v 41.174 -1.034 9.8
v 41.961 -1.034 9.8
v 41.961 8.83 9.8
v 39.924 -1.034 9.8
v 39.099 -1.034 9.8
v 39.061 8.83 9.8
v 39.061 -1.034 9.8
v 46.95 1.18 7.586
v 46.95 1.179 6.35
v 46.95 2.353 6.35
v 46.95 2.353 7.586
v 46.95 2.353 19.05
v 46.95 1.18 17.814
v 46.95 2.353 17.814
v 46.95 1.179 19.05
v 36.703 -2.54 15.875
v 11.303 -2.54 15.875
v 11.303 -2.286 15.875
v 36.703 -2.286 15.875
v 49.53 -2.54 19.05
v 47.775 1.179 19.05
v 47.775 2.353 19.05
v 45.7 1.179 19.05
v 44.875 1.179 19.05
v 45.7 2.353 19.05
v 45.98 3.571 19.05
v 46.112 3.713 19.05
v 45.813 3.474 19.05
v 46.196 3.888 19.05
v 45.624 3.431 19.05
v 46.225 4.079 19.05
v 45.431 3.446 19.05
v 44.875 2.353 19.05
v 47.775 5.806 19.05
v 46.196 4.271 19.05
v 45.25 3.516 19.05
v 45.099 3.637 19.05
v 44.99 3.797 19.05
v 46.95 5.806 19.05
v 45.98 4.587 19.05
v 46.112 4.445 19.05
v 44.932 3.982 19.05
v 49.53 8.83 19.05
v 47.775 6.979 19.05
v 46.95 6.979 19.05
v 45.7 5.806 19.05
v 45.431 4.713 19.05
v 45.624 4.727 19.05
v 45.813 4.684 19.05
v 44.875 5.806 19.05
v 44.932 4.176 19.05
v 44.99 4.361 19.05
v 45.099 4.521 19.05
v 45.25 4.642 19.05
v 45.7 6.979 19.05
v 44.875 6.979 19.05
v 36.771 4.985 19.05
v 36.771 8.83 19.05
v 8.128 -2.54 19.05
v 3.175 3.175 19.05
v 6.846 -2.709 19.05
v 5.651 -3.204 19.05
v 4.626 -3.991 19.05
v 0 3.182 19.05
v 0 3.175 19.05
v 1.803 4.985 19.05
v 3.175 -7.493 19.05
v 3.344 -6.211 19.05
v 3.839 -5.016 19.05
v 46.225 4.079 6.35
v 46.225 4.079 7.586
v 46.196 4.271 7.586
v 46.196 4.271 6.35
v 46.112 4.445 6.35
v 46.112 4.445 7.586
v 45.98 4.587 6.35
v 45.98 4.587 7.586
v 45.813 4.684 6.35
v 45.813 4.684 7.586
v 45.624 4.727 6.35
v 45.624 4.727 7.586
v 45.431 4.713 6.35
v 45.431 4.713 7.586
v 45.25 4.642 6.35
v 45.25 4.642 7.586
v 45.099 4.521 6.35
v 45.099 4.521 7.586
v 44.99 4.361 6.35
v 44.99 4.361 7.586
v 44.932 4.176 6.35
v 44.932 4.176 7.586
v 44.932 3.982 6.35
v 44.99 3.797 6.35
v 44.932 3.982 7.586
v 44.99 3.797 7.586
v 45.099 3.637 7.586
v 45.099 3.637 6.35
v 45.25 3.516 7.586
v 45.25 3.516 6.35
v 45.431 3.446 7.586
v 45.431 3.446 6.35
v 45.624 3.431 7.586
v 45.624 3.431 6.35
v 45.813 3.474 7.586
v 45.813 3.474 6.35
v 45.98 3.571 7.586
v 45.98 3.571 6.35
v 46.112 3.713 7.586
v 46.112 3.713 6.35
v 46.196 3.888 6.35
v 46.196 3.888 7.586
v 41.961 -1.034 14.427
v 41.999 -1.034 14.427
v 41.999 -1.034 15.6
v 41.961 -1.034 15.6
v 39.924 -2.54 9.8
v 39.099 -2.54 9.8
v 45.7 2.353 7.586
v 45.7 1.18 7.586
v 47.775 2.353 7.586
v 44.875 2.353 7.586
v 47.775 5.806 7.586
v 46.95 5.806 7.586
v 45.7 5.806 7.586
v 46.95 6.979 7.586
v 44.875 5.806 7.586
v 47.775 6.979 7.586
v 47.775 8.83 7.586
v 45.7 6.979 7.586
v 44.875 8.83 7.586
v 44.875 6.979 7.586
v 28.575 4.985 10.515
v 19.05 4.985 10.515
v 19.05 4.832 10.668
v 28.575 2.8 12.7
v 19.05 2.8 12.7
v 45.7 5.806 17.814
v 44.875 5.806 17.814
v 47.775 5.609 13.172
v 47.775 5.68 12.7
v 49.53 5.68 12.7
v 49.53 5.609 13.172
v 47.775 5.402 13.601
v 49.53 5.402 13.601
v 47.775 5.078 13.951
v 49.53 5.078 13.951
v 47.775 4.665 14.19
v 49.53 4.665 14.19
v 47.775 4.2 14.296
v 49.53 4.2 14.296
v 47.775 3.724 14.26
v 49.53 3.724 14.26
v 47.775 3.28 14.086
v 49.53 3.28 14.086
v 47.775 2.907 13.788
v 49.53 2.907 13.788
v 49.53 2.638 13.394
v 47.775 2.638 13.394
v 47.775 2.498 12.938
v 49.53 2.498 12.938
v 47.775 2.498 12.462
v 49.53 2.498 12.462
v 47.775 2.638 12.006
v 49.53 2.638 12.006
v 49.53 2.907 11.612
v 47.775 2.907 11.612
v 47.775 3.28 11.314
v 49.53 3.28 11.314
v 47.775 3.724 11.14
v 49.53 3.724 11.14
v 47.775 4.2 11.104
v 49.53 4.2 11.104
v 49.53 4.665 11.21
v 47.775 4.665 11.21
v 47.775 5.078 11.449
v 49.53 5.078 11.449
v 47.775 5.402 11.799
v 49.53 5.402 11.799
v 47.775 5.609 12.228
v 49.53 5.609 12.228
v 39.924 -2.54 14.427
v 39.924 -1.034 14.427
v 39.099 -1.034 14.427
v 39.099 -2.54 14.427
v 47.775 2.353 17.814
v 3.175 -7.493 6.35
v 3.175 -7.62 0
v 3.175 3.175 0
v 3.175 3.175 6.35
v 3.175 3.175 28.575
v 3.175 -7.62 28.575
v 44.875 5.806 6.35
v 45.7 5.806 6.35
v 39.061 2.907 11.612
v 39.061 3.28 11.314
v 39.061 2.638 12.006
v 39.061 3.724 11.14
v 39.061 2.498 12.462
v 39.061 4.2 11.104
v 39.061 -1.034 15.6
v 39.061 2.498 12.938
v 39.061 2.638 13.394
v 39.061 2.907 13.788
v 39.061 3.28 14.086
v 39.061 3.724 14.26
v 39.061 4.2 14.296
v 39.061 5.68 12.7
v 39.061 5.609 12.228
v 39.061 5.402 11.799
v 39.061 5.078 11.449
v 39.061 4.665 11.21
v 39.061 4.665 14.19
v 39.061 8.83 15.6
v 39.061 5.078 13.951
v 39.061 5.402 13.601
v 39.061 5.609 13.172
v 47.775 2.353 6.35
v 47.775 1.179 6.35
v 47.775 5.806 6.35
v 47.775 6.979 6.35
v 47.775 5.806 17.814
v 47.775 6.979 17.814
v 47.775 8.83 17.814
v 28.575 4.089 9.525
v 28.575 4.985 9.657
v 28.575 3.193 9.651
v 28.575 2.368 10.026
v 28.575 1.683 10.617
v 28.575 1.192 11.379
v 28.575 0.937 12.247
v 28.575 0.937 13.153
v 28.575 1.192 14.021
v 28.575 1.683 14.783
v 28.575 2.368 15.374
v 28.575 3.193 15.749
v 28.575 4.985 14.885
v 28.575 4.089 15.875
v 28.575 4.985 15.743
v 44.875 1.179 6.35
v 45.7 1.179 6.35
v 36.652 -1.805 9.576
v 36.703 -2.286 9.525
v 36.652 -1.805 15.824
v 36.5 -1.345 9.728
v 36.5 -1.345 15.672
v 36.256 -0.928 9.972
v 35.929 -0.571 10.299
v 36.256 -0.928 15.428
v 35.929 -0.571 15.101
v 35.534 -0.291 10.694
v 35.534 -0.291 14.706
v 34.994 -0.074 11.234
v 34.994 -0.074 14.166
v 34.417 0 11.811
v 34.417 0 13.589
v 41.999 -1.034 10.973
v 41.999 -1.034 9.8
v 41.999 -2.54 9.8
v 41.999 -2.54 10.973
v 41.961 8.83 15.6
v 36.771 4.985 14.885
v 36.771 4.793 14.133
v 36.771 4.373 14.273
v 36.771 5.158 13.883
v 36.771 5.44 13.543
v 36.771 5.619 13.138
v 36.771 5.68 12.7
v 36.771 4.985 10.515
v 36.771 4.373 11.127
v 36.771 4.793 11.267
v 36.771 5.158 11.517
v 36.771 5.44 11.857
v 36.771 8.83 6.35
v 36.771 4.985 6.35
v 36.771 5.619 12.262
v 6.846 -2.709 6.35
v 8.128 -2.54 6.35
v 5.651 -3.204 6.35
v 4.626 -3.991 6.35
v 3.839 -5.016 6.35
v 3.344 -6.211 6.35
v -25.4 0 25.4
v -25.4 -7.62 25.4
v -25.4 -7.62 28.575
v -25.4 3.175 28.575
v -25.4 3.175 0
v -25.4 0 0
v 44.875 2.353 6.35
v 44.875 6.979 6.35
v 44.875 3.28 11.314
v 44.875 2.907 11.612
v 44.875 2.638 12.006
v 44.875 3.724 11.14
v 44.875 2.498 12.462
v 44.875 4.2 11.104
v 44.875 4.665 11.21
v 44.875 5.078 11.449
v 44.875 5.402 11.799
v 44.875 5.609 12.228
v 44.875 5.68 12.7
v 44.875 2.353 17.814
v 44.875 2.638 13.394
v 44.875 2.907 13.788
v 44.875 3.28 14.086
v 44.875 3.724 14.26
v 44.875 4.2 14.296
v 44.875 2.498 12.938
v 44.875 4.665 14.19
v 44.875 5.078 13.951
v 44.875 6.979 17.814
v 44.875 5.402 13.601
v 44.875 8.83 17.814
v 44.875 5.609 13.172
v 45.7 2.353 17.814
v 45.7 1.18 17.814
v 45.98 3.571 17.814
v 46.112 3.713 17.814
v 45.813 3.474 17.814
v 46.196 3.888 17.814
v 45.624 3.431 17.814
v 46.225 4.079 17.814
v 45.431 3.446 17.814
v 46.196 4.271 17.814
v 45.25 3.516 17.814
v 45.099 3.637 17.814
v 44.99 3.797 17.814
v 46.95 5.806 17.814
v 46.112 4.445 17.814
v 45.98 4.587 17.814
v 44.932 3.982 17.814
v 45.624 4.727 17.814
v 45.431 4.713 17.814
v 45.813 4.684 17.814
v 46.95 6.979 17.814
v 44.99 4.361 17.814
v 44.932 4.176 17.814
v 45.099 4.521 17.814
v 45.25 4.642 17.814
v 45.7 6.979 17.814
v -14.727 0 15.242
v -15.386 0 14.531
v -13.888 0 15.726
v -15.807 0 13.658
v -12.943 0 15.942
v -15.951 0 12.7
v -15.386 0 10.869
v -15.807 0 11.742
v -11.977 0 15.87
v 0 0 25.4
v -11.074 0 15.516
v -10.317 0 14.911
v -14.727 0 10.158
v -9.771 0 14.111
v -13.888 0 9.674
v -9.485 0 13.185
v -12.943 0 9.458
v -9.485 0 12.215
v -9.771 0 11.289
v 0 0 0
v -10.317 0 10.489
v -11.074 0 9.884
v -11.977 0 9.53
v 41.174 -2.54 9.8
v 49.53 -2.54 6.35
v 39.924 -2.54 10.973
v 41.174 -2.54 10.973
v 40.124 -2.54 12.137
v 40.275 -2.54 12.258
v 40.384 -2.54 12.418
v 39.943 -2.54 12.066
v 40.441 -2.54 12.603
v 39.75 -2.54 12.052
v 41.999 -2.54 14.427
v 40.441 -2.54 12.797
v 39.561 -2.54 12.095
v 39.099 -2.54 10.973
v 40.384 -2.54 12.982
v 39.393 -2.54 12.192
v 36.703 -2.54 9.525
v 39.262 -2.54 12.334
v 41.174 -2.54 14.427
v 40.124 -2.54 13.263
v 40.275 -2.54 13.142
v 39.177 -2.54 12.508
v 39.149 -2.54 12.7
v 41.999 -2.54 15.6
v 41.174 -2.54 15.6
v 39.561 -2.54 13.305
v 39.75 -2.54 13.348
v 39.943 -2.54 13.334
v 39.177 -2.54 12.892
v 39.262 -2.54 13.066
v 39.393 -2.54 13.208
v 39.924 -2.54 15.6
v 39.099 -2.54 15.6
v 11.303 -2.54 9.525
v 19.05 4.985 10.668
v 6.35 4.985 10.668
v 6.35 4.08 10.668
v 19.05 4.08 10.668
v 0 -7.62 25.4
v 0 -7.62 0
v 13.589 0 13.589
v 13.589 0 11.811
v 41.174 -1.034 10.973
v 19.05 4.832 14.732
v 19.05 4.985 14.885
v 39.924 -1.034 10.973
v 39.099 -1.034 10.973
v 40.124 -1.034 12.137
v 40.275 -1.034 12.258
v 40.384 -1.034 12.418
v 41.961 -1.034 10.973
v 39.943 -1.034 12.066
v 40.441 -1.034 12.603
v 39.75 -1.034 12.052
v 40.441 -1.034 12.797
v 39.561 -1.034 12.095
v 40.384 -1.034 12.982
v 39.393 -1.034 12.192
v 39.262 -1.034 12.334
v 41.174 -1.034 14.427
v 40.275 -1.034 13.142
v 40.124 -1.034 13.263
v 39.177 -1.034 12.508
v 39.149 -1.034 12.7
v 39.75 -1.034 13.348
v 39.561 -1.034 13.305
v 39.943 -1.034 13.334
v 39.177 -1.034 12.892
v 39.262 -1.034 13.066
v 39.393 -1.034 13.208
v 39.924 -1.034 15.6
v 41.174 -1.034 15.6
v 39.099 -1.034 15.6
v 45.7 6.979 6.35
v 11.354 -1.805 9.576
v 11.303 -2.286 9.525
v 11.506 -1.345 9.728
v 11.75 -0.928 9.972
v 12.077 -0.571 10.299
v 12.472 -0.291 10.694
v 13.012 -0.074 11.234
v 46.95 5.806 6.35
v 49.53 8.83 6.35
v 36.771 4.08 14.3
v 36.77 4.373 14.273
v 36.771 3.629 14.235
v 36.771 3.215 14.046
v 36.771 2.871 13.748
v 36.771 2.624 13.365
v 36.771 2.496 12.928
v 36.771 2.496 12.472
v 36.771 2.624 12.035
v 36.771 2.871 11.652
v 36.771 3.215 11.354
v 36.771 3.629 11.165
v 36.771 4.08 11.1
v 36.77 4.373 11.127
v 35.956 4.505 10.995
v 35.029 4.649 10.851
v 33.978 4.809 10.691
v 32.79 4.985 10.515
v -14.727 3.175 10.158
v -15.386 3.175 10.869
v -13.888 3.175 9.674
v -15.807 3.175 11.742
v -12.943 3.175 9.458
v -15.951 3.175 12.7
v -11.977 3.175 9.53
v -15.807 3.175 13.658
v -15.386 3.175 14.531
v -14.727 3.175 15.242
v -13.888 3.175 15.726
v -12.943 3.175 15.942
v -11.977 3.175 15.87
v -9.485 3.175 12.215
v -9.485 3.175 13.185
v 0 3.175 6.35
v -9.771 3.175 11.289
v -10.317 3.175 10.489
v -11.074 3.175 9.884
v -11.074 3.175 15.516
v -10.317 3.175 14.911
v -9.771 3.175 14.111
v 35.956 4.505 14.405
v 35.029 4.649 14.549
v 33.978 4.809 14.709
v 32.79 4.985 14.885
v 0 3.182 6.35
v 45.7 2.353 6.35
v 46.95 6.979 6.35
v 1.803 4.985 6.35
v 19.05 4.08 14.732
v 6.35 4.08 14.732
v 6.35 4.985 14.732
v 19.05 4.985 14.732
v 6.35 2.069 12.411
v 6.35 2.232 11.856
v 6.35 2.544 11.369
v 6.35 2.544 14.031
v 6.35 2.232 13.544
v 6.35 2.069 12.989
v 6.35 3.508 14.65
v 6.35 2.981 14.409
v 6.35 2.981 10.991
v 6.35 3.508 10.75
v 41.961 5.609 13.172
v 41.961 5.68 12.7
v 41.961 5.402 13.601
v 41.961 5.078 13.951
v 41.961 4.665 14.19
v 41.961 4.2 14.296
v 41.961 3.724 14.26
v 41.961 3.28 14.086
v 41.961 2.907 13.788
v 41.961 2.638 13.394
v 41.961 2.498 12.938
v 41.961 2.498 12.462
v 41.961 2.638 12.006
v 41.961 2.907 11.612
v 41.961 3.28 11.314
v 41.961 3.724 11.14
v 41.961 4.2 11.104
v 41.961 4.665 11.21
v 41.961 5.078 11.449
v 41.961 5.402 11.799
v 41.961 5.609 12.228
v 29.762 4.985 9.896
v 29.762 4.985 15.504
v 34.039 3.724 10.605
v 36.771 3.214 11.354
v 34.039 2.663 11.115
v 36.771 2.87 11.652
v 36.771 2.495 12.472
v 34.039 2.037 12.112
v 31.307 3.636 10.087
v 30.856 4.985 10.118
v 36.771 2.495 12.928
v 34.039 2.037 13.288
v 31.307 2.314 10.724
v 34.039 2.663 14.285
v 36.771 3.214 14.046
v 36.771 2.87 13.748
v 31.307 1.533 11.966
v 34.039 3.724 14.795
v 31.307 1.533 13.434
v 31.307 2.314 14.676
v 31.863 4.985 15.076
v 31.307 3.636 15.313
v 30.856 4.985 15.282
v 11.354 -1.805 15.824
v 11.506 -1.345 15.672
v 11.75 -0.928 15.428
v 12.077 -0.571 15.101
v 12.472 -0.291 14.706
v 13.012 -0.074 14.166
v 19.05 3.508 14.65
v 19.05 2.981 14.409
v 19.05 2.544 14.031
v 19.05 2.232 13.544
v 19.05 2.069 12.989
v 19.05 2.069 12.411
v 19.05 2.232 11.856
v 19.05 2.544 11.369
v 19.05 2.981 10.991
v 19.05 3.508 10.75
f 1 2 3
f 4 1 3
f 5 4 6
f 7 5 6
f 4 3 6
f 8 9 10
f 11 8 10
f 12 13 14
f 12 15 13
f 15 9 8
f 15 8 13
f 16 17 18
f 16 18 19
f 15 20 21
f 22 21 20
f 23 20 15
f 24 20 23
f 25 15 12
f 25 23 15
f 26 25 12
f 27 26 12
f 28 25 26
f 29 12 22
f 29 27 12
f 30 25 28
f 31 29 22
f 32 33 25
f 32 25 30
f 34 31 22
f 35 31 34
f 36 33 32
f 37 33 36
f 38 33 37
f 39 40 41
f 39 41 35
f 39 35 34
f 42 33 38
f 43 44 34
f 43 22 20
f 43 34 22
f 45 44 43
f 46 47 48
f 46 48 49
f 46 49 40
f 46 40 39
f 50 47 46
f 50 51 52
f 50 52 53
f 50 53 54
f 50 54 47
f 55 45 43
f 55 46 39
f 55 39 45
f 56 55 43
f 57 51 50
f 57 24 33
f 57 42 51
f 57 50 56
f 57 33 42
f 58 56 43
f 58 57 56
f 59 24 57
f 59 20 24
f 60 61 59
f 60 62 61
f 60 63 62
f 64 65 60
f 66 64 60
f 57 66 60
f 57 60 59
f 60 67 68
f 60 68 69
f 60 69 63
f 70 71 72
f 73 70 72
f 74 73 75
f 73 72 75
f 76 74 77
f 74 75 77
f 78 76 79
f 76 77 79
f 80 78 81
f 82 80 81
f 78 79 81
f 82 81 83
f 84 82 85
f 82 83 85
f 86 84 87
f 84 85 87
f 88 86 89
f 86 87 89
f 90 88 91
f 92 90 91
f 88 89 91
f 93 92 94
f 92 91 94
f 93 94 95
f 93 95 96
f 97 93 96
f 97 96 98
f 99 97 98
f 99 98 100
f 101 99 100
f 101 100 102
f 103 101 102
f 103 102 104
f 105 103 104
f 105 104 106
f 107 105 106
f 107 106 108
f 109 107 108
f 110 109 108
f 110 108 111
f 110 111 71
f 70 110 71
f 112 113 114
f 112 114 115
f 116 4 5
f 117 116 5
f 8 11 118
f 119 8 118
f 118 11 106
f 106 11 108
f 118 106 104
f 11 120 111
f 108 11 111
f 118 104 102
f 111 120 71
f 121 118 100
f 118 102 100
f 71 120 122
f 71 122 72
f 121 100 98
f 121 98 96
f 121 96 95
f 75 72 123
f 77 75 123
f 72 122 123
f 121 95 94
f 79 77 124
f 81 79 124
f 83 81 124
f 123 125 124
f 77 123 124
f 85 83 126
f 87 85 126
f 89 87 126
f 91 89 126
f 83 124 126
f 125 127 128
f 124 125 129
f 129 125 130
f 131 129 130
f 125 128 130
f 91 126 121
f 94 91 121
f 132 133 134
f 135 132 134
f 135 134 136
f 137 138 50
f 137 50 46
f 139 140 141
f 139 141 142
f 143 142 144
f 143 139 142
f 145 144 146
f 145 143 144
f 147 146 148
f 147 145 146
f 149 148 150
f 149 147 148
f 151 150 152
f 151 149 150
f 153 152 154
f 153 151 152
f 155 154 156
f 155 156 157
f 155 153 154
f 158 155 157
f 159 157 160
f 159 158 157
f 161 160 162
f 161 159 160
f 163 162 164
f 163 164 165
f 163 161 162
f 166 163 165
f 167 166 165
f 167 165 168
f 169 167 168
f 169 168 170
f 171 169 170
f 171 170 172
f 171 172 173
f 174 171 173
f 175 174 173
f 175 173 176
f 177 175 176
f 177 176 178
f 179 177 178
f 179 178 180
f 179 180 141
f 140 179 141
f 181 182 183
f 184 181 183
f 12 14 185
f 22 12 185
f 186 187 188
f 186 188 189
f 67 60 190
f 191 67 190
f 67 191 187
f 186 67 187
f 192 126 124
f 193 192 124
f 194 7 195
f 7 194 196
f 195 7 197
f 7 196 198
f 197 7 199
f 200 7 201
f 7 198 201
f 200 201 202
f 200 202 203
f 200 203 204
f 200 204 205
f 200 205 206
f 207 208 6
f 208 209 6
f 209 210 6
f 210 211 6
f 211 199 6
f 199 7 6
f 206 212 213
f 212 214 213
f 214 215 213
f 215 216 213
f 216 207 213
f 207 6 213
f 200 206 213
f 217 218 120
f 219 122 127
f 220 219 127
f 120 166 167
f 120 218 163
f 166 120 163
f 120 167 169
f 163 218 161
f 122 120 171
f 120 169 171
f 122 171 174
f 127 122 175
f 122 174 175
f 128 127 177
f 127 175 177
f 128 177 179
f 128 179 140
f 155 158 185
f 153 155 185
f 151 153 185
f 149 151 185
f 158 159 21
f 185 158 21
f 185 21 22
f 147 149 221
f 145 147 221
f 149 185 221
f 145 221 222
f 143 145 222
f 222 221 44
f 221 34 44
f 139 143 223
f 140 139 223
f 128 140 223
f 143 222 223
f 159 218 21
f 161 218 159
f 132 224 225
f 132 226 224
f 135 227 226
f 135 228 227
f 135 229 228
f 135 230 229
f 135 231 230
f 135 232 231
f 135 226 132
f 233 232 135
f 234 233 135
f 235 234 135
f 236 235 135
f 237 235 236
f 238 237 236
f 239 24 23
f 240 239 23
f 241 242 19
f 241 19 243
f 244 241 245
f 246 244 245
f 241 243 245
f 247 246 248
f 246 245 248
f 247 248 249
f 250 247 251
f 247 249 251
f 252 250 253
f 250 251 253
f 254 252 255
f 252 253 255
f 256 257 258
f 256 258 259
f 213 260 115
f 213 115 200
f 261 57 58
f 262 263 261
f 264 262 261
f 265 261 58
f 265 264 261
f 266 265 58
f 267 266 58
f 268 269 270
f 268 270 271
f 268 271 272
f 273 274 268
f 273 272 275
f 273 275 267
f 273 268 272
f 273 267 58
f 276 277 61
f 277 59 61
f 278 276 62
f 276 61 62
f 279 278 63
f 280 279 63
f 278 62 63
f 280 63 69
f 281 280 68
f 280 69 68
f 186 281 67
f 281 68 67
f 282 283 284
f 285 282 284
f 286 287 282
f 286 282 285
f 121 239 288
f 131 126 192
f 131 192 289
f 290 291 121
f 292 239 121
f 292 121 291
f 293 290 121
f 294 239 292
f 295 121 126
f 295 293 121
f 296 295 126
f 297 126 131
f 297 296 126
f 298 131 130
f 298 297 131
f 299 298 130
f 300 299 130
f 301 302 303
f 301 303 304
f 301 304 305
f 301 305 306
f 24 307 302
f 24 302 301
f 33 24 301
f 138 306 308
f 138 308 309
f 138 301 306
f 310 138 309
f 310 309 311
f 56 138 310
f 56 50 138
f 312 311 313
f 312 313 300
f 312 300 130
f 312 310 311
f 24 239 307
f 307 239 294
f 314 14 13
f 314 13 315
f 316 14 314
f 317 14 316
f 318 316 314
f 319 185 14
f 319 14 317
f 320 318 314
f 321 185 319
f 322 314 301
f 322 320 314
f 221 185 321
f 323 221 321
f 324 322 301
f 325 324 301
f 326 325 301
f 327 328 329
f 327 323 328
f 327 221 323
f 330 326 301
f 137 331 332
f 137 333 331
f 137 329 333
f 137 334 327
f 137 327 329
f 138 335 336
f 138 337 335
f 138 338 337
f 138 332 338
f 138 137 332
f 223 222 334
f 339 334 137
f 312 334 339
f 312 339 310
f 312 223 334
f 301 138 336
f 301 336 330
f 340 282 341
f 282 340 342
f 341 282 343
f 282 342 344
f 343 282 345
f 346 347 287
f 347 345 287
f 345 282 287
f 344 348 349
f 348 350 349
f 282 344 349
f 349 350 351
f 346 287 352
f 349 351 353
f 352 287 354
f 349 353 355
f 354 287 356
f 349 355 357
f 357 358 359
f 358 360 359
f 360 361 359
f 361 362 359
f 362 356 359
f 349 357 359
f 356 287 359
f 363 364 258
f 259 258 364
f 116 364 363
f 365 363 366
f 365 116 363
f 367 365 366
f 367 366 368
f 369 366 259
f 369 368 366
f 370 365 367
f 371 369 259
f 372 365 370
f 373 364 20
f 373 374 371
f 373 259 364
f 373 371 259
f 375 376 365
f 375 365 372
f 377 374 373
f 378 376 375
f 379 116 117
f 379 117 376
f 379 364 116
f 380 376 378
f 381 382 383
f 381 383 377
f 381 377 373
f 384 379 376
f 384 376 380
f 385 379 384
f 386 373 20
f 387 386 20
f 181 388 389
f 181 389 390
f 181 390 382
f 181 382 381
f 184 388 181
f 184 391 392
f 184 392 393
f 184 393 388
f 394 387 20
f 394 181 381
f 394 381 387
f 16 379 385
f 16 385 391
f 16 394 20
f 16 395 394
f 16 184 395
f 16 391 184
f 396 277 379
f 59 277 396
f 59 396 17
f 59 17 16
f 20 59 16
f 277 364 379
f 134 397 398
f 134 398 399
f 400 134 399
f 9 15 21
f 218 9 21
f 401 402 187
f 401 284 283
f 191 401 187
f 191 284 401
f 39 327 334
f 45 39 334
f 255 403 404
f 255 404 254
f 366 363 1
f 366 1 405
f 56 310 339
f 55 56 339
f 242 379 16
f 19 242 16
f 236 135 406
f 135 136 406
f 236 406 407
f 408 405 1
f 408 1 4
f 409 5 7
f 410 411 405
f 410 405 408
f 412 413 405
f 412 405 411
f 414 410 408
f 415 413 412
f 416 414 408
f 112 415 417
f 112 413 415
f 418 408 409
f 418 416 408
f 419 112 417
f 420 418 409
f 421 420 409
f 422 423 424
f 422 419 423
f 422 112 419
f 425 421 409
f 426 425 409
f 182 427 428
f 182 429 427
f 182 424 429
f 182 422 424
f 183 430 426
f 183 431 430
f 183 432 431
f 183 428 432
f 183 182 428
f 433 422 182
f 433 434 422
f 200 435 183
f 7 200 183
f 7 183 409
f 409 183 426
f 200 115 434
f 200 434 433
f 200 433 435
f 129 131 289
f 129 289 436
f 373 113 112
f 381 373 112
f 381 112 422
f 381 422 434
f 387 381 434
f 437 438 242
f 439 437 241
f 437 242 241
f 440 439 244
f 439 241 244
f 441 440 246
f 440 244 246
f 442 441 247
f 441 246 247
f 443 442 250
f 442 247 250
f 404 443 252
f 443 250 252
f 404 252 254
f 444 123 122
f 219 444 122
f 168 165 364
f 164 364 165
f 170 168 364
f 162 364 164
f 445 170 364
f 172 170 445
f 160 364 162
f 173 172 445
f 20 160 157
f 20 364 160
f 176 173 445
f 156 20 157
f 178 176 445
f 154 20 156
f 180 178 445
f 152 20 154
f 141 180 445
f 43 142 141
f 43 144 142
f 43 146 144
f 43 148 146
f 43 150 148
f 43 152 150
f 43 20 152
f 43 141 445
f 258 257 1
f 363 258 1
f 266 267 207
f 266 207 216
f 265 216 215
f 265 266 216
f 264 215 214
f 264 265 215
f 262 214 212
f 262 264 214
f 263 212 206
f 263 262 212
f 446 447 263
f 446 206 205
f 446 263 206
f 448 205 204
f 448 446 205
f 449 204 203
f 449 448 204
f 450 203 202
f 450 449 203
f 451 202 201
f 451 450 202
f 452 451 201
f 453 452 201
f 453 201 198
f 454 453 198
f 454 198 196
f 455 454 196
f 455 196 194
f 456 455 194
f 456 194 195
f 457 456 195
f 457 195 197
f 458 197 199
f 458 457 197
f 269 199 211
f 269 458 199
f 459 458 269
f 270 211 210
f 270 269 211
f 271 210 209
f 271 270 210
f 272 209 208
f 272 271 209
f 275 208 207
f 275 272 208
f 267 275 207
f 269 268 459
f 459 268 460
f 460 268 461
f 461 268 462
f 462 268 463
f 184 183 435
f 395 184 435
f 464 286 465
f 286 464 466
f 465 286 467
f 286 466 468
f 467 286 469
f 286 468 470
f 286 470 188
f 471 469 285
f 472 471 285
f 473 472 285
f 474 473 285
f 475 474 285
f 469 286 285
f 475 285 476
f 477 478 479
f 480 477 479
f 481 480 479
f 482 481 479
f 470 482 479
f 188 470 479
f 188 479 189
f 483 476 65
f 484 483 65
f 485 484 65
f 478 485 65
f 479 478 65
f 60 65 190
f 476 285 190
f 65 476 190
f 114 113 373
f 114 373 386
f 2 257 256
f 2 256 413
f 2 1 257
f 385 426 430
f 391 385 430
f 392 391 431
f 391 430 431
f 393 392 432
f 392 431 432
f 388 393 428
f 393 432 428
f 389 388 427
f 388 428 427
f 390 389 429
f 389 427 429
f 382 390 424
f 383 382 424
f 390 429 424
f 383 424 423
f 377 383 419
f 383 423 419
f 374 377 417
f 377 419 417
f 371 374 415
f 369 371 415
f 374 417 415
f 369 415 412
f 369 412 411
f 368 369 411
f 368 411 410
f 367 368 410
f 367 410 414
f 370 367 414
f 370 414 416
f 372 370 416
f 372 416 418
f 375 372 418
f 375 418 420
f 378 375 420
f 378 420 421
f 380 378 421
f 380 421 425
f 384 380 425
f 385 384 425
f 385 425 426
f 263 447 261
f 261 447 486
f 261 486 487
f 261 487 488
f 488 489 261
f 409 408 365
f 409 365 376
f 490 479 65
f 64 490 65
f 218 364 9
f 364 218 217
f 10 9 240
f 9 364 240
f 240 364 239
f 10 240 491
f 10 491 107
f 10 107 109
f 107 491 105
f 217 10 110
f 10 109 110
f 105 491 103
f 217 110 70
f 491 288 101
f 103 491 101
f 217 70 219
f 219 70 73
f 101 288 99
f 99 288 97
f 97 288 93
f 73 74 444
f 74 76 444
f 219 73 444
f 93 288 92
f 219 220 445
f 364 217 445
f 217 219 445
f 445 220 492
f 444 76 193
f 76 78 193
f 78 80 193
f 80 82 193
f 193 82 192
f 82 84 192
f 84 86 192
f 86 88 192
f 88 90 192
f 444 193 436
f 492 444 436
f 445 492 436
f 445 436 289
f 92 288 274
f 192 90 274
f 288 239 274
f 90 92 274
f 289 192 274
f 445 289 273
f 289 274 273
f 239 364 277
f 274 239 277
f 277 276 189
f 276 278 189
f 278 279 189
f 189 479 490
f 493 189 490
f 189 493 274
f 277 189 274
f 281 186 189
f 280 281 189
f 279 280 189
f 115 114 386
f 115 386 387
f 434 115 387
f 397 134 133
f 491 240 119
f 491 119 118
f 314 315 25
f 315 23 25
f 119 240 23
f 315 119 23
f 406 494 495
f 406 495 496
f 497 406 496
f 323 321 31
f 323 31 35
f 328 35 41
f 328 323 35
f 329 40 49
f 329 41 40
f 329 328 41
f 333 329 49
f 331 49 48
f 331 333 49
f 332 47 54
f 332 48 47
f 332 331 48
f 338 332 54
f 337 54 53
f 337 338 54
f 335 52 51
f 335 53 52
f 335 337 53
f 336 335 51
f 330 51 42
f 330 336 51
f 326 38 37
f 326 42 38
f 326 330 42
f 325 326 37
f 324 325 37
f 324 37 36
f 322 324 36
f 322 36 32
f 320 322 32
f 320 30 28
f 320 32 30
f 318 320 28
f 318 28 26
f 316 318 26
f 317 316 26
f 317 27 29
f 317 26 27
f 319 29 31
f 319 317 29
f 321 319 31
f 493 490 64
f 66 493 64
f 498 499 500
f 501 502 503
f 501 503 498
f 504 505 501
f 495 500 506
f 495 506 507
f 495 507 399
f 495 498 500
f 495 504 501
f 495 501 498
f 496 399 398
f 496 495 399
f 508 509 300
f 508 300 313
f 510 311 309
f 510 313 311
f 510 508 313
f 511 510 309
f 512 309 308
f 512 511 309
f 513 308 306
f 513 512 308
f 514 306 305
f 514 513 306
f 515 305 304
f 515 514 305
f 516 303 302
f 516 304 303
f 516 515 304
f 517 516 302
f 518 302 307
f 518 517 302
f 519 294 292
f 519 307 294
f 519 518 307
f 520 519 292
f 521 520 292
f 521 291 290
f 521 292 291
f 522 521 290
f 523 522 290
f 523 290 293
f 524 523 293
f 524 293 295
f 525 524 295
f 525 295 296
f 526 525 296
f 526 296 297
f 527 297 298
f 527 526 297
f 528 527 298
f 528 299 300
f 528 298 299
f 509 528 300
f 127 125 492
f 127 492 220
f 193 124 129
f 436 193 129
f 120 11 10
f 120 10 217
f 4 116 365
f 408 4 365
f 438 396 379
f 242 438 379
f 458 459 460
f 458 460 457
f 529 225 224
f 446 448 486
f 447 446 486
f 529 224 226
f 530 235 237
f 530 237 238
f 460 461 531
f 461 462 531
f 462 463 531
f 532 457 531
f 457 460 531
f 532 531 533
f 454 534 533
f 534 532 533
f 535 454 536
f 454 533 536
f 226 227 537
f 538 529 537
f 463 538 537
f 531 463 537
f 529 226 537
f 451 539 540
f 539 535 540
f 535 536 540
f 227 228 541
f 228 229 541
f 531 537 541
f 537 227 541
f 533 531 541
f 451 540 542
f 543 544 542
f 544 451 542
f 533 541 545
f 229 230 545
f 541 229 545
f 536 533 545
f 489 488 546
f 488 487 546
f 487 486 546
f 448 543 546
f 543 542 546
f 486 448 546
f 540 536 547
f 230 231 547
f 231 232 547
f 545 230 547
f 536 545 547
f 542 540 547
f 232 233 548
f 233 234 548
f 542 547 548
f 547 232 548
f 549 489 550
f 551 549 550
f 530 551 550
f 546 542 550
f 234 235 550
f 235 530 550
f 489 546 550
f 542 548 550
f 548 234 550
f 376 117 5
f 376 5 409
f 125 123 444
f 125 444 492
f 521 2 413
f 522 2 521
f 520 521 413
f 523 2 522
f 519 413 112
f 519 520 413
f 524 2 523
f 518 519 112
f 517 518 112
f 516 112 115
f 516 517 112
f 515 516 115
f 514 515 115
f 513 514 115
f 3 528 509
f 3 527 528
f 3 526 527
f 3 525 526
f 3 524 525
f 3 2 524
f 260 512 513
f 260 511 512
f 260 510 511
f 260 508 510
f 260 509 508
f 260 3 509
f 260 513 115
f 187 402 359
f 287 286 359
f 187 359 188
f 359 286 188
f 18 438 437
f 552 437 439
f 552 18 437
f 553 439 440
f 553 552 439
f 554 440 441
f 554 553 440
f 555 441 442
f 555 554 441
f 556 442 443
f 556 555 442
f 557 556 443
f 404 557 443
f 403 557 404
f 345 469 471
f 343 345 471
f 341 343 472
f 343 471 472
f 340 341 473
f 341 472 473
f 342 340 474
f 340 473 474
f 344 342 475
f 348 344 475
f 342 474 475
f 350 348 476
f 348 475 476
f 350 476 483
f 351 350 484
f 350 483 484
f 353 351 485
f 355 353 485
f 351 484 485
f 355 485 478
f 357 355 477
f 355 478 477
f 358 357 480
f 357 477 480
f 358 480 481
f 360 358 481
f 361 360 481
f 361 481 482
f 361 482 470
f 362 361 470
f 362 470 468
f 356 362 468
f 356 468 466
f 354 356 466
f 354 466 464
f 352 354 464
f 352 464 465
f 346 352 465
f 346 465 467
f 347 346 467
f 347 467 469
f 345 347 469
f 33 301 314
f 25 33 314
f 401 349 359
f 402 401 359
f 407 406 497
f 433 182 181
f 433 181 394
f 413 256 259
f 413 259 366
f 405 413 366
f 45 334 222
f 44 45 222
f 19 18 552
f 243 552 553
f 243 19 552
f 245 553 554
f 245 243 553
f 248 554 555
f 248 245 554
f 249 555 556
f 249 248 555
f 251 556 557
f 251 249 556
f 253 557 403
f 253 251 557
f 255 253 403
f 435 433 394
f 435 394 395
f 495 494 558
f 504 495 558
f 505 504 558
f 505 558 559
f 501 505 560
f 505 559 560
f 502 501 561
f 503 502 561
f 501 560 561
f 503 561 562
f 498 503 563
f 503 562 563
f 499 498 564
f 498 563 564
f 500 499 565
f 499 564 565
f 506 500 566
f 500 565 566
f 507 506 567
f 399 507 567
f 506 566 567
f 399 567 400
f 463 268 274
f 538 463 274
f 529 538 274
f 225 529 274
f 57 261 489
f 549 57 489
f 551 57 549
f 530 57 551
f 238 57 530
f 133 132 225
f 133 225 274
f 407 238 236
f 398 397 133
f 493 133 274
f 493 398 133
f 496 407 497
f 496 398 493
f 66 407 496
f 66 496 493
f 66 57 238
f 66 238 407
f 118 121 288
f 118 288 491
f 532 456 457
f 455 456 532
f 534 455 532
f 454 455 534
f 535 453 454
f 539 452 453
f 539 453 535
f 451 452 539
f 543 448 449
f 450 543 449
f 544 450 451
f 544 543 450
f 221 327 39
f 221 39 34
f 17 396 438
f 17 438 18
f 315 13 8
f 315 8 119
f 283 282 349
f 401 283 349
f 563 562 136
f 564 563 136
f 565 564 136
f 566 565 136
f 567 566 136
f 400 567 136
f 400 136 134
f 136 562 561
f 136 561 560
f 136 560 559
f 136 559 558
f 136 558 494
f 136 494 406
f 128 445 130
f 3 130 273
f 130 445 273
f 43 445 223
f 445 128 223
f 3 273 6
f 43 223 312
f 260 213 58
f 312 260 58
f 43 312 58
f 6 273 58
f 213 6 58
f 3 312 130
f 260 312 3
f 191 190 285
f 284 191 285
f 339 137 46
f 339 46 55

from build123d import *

# Parameters (mm, degrees)
SKETCH_W             = 25.4
SKETCH_H             = 3.175
PAD_DEPTH            = 25.4
SKETCH001_W          = 28.575
SKETCH001_H          = 12.7
PAD001_DEPTH         = 1.81
PAD001_DEPTH_BACK    = 5.715
POCKET_DEPTH         = 9.525
POCKET001_DEPTH      = 12.7
CHAMFER_SIZE         = 1.8034
SKETCH004_R          = 3.2512
POCKET002_DEPTH      = 5.716
PAD002_DEPTH         = 10.795
FILLET_R             = 4.953
SKETCH013_W          = 11.37
SKETCH013_H          = 12.7
SKETCH013_R          = 1.6002
PAD008_DEPTH         = 20.955
POCKET003_DEPTH      = 8.1961
SKETCH014_W          = 2.9
SKETCH014_H          = 10.2288
POCKET004_DEPTH      = 7.65
SKETCH015_W          = 2.9
SKETCH015_H          = 5.8
POCKET005_DEPTH      = 9.8644
SKETCH016_R          = 0.65
SKETCH016_W          = 0.825
SKETCH016_H          = 1.173477
POCKET006_DEPTH      = 6.5866
SKETCH017_R          = 0.65
SKETCH017_W          = 0.825
SKETCH017_H          = 1.173477
POCKET007_DEPTH      = 7.5866
POCKET007_DEPTH_BACK = 20.9904
SKETCH018_R          = 1.6002
SKETCH019_R          = 3.175
SKETCH020_W          = 25.4
SKETCH020_H          = 6.35
POCKET008_DEPTH      = 2.54
FILLET001_R          = 2.286


with BuildPart() as part:
    # Sketch → Pad (new body)
    with BuildSketch(Plane.XY):
        with Locations((-12.7, 1.5875)):
            Rectangle(SKETCH_W, SKETCH_H)
    extrude(amount=PAD_DEPTH)

    # Sketch001 (on Face1 of Pad) → Pad001 (join, two sides)
    with BuildSketch(Plane(origin=(0, 3.175, 0), x_dir=(-1, 0, 0), z_dir=(0, 1, 0))) as pad001_sk:
        with Locations((-14.2875, 12.7)):
            Rectangle(SKETCH001_W, SKETCH001_H)
    extrude(amount=PAD001_DEPTH)
    extrude(pad001_sk.sketch, amount=-PAD001_DEPTH_BACK)

    # Sketch002 (on Face13 of Pad001) → Pocket (cut)
    with BuildSketch(Plane.YZ.offset(28.575)):
        Polygon((9.150137, 19.05), (2.800137, 12.7), (9.150137, 6.35), align=None)
    extrude(amount=-POCKET_DEPTH, mode=Mode.SUBTRACT)

    # Sketch003 (on Face16 of Pocket) → Pocket001 (cut)
    with BuildSketch(Plane.YZ.offset(19.05)):
        with BuildLine():
            ThreePointArc((4.08, 14.732), (2.048, 12.7), (4.08, 10.668))
            Line((4.985, 10.668), (4.08, 10.668))
            Line((4.985, 14.732), (4.985, 10.668))
            Line((4.08, 14.732), (4.985, 14.732))
        make_face()
    extrude(amount=-POCKET001_DEPTH, mode=Mode.SUBTRACT)

    # Chamfer
    chamfer_edges = [part.edges().sort_by_distance(p)[0] for p in [
        (0, 4.985, 12.7),
    ]]
    chamfer(chamfer_edges, length=CHAMFER_SIZE)

    # Sketch004 (on Face4 of Chamfer) → Pocket002 (cut, through all)
    with BuildSketch(Plane(origin=(0, 3.175, 0), x_dir=(-1, 0, 0), z_dir=(0, 1, 0))):
        with Locations((12.7, 12.7)):
            Circle(SKETCH004_R)
    extrude(amount=-POCKET002_DEPTH, mode=Mode.SUBTRACT)

    # Sketch006 (on Face4 of Pocket002) → Pad002 (join)
    with BuildSketch(Plane(origin=(0, 3.175, 0), x_dir=(-1, 0, 0), z_dir=(0, 1, 0))):
        Polygon((0, 0), (-3.175, 0), (-3.175, 28.575), (25.4, 28.575), (25.4, 25.4), (0, 25.4), align=None)
    extrude(amount=-PAD002_DEPTH)

    # Fillet
    fillet_edges = [part.edges().sort_by_distance(p)[0] for p in [
        (3.175, -2.54, 12.7),
    ]]
    fillet(fillet_edges, radius=FILLET_R)

    # Sketch013 (on Face4 of Fillet) → Pad008 (join)
    with BuildSketch(Plane.YZ.offset(28.575)):
        with Locations((3.145, 12.7)):
            Rectangle(SKETCH013_W, SKETCH013_H)
        with Locations((4.08, 12.7)):
            Circle(SKETCH013_R, mode=Mode.SUBTRACT)
    extrude(amount=PAD008_DEPTH)

    # Pad008 Face13 → Pocket003 (cut)
    with BuildSketch(Plane(origin=(28.575, 6.929443, 12.7), x_dir=(0, 1, 0), z_dir=(-1, 0, 0))):
        with BuildLine():
            Line((-1.944443, -2.184863), (-1.944443, -6.35))
            Line((-1.944443, -6.35), (1.900557, -6.35))
            Line((1.900557, -6.35), (1.900557, 6.35))
            Line((1.900557, 6.35), (-1.944443, 6.35))
            Line((-1.944443, 6.35), (-1.944443, 2.184863))
            Line((-1.944443, 2.184863), (-2.556204, 1.573102))
            ThreePointArc((-2.556204, 1.573102), (-1.618614, 1.022594), (-1.249243, 0))
            ThreePointArc((-1.249243, 0), (-1.618614, -1.022594), (-2.556204, -1.573102))
            Line((-2.556204, -1.573102), (-1.944443, -2.184863))
        make_face()
    extrude(amount=-POCKET003_DEPTH, mode=Mode.SUBTRACT)

    # Sketch014 (on Face15 of Pocket003) → Pocket004 (cut)
    with BuildSketch(Plane(origin=(0, 8.83, 0), x_dir=(-1, 0, 0), z_dir=(0, 1, 0))):
        with Locations((-46.325, 12.7)):
            Rectangle(SKETCH014_W, SKETCH014_H)
    extrude(amount=-POCKET004_DEPTH, mode=Mode.SUBTRACT)

    # Sketch015 (on Face15 of Pocket004) → Pocket005 (cut)
    with BuildSketch(Plane(origin=(0, 8.83, 0), x_dir=(-1, 0, 0), z_dir=(0, 1, 0))):
        with Locations((-40.5108, 12.7)):
            Rectangle(SKETCH015_W, SKETCH015_H)
    extrude(amount=-POCKET005_DEPTH, mode=Mode.SUBTRACT)

    # Sketch016 (on Face53 of Pocket005) → Pocket006 (cut, through all)
    with BuildSketch(Plane(origin=(0, -1.0344, 0), x_dir=(-1, 0, 0), z_dir=(0, 1, 0))):
        with Locations((-39.79856, 12.7)):
            Circle(SKETCH016_R)
        with Locations((-41.58606, 15.013261)):
            Rectangle(SKETCH016_W, SKETCH016_H)
        with Locations((-41.58606, 10.386738)):
            Rectangle(SKETCH016_W, SKETCH016_H)
        with Locations((-39.51106, 15.013261)):
            Rectangle(SKETCH016_W, SKETCH016_H)
        with Locations((-39.51106, 10.386738)):
            Rectangle(SKETCH016_W, SKETCH016_H)
    extrude(amount=-POCKET006_DEPTH, mode=Mode.SUBTRACT)

    # Sketch017 (on Face52 of Pocket006) → Pocket007 (cut, two sides)
    with BuildSketch(Plane.XY.offset(7.5856)) as pocket007_sk:
        with Locations((45.57522, 4.07924)):
            Circle(SKETCH017_R)
        with Locations((45.2875, 6.392501)):
            Rectangle(SKETCH017_W, SKETCH017_H)
        with Locations((45.2875, 1.765978)):
            Rectangle(SKETCH017_W, SKETCH017_H)
        with Locations((47.3625, 6.392501)):
            Rectangle(SKETCH017_W, SKETCH017_H)
        with Locations((47.3625, 1.765978)):
            Rectangle(SKETCH017_W, SKETCH017_H)
    extrude(amount=-POCKET007_DEPTH, mode=Mode.SUBTRACT)
    extrude(pocket007_sk.sketch, amount=POCKET007_DEPTH_BACK, mode=Mode.SUBTRACT)

    # Sketch018 (on Face12 of Pocket007) → SubtractiveLoft section 0
    with BuildSketch(Plane(origin=(36.7711, 0, 0), x_dir=(0, -1, 0), z_dir=(-1, 0, 0))):
        with Locations((-4.07924, 12.7)):
            Circle(SKETCH018_R)
    # Sketch019 (on Face87 of Pocket007) → SubtractiveLoft section 1
    with BuildSketch(Plane.YZ.offset(28.575)):
        with Locations((4.07924, 12.7)):
            Circle(SKETCH019_R)
    loft(mode=Mode.SUBTRACT)

    # Sketch020 (on Face2 of SubtractiveLoft) → Pocket008 (cut)
    with BuildSketch(Plane.XZ.offset(2.54)):
        with Locations((24.003, 12.7)):
            Rectangle(SKETCH020_W, SKETCH020_H)
    extrude(amount=-POCKET008_DEPTH, mode=Mode.SUBTRACT)

    # Fillet001
    fillet001_edges = [part.edges().sort_by_distance(p)[0] for p in [
        (24.003, 0, 15.875),
        (36.703, 0, 12.7),
        (24.003, 0, 9.525),
        (11.303, 0, 12.7),
    ]]
    fillet(fillet001_edges, radius=FILLET001_R)


solid = part.part
